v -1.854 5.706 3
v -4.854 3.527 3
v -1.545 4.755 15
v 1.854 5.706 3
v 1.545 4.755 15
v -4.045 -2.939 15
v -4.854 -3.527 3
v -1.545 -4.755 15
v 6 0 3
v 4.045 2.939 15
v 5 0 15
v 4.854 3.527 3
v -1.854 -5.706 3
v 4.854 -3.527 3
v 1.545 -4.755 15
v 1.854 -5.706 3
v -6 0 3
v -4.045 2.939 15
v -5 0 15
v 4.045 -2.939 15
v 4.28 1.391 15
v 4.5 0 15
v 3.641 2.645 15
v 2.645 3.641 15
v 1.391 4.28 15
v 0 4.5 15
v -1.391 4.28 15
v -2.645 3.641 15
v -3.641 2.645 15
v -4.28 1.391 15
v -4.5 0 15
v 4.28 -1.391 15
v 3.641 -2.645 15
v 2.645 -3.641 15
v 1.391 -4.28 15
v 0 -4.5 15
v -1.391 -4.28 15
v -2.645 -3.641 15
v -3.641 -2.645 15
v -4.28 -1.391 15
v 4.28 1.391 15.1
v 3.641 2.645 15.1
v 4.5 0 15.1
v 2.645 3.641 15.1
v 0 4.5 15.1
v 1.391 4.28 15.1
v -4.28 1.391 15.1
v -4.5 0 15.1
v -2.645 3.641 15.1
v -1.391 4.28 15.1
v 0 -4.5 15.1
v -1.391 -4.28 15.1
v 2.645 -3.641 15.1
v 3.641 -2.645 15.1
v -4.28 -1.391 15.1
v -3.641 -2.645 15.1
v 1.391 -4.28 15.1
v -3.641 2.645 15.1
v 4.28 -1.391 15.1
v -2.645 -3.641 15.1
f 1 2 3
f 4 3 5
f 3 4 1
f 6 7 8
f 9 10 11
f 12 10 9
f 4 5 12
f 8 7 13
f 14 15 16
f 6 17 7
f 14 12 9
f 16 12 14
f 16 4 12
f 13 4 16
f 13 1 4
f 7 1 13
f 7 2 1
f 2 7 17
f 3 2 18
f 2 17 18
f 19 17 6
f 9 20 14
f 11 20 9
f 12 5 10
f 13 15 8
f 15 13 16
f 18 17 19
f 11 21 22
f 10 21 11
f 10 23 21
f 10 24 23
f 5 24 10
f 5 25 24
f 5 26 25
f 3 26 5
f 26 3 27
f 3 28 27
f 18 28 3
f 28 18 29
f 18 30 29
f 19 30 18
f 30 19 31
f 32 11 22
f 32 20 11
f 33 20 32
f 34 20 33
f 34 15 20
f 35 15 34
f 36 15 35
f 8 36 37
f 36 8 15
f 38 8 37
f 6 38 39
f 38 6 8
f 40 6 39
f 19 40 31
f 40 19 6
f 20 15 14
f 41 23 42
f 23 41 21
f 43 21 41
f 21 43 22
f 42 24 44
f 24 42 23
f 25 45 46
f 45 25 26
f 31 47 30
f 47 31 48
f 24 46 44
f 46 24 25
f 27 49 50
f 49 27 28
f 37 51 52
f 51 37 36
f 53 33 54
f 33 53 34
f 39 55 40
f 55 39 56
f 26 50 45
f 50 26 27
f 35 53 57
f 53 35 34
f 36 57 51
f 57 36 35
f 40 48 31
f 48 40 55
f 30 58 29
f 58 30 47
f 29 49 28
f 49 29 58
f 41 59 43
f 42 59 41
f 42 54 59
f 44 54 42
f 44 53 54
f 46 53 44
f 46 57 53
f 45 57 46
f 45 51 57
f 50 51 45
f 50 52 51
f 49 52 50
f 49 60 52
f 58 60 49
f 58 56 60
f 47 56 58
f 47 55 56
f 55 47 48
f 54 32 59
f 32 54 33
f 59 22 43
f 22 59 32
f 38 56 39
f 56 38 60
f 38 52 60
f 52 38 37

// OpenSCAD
knob(color="blue");
module knob(color="red"){
    translate([0,0,3]){
        cylinder(12,6,5,$fn=10);
        translate([0,0,11.1]) color(color) cylinder(1,r=4.5,$fn=20);
    }
}
